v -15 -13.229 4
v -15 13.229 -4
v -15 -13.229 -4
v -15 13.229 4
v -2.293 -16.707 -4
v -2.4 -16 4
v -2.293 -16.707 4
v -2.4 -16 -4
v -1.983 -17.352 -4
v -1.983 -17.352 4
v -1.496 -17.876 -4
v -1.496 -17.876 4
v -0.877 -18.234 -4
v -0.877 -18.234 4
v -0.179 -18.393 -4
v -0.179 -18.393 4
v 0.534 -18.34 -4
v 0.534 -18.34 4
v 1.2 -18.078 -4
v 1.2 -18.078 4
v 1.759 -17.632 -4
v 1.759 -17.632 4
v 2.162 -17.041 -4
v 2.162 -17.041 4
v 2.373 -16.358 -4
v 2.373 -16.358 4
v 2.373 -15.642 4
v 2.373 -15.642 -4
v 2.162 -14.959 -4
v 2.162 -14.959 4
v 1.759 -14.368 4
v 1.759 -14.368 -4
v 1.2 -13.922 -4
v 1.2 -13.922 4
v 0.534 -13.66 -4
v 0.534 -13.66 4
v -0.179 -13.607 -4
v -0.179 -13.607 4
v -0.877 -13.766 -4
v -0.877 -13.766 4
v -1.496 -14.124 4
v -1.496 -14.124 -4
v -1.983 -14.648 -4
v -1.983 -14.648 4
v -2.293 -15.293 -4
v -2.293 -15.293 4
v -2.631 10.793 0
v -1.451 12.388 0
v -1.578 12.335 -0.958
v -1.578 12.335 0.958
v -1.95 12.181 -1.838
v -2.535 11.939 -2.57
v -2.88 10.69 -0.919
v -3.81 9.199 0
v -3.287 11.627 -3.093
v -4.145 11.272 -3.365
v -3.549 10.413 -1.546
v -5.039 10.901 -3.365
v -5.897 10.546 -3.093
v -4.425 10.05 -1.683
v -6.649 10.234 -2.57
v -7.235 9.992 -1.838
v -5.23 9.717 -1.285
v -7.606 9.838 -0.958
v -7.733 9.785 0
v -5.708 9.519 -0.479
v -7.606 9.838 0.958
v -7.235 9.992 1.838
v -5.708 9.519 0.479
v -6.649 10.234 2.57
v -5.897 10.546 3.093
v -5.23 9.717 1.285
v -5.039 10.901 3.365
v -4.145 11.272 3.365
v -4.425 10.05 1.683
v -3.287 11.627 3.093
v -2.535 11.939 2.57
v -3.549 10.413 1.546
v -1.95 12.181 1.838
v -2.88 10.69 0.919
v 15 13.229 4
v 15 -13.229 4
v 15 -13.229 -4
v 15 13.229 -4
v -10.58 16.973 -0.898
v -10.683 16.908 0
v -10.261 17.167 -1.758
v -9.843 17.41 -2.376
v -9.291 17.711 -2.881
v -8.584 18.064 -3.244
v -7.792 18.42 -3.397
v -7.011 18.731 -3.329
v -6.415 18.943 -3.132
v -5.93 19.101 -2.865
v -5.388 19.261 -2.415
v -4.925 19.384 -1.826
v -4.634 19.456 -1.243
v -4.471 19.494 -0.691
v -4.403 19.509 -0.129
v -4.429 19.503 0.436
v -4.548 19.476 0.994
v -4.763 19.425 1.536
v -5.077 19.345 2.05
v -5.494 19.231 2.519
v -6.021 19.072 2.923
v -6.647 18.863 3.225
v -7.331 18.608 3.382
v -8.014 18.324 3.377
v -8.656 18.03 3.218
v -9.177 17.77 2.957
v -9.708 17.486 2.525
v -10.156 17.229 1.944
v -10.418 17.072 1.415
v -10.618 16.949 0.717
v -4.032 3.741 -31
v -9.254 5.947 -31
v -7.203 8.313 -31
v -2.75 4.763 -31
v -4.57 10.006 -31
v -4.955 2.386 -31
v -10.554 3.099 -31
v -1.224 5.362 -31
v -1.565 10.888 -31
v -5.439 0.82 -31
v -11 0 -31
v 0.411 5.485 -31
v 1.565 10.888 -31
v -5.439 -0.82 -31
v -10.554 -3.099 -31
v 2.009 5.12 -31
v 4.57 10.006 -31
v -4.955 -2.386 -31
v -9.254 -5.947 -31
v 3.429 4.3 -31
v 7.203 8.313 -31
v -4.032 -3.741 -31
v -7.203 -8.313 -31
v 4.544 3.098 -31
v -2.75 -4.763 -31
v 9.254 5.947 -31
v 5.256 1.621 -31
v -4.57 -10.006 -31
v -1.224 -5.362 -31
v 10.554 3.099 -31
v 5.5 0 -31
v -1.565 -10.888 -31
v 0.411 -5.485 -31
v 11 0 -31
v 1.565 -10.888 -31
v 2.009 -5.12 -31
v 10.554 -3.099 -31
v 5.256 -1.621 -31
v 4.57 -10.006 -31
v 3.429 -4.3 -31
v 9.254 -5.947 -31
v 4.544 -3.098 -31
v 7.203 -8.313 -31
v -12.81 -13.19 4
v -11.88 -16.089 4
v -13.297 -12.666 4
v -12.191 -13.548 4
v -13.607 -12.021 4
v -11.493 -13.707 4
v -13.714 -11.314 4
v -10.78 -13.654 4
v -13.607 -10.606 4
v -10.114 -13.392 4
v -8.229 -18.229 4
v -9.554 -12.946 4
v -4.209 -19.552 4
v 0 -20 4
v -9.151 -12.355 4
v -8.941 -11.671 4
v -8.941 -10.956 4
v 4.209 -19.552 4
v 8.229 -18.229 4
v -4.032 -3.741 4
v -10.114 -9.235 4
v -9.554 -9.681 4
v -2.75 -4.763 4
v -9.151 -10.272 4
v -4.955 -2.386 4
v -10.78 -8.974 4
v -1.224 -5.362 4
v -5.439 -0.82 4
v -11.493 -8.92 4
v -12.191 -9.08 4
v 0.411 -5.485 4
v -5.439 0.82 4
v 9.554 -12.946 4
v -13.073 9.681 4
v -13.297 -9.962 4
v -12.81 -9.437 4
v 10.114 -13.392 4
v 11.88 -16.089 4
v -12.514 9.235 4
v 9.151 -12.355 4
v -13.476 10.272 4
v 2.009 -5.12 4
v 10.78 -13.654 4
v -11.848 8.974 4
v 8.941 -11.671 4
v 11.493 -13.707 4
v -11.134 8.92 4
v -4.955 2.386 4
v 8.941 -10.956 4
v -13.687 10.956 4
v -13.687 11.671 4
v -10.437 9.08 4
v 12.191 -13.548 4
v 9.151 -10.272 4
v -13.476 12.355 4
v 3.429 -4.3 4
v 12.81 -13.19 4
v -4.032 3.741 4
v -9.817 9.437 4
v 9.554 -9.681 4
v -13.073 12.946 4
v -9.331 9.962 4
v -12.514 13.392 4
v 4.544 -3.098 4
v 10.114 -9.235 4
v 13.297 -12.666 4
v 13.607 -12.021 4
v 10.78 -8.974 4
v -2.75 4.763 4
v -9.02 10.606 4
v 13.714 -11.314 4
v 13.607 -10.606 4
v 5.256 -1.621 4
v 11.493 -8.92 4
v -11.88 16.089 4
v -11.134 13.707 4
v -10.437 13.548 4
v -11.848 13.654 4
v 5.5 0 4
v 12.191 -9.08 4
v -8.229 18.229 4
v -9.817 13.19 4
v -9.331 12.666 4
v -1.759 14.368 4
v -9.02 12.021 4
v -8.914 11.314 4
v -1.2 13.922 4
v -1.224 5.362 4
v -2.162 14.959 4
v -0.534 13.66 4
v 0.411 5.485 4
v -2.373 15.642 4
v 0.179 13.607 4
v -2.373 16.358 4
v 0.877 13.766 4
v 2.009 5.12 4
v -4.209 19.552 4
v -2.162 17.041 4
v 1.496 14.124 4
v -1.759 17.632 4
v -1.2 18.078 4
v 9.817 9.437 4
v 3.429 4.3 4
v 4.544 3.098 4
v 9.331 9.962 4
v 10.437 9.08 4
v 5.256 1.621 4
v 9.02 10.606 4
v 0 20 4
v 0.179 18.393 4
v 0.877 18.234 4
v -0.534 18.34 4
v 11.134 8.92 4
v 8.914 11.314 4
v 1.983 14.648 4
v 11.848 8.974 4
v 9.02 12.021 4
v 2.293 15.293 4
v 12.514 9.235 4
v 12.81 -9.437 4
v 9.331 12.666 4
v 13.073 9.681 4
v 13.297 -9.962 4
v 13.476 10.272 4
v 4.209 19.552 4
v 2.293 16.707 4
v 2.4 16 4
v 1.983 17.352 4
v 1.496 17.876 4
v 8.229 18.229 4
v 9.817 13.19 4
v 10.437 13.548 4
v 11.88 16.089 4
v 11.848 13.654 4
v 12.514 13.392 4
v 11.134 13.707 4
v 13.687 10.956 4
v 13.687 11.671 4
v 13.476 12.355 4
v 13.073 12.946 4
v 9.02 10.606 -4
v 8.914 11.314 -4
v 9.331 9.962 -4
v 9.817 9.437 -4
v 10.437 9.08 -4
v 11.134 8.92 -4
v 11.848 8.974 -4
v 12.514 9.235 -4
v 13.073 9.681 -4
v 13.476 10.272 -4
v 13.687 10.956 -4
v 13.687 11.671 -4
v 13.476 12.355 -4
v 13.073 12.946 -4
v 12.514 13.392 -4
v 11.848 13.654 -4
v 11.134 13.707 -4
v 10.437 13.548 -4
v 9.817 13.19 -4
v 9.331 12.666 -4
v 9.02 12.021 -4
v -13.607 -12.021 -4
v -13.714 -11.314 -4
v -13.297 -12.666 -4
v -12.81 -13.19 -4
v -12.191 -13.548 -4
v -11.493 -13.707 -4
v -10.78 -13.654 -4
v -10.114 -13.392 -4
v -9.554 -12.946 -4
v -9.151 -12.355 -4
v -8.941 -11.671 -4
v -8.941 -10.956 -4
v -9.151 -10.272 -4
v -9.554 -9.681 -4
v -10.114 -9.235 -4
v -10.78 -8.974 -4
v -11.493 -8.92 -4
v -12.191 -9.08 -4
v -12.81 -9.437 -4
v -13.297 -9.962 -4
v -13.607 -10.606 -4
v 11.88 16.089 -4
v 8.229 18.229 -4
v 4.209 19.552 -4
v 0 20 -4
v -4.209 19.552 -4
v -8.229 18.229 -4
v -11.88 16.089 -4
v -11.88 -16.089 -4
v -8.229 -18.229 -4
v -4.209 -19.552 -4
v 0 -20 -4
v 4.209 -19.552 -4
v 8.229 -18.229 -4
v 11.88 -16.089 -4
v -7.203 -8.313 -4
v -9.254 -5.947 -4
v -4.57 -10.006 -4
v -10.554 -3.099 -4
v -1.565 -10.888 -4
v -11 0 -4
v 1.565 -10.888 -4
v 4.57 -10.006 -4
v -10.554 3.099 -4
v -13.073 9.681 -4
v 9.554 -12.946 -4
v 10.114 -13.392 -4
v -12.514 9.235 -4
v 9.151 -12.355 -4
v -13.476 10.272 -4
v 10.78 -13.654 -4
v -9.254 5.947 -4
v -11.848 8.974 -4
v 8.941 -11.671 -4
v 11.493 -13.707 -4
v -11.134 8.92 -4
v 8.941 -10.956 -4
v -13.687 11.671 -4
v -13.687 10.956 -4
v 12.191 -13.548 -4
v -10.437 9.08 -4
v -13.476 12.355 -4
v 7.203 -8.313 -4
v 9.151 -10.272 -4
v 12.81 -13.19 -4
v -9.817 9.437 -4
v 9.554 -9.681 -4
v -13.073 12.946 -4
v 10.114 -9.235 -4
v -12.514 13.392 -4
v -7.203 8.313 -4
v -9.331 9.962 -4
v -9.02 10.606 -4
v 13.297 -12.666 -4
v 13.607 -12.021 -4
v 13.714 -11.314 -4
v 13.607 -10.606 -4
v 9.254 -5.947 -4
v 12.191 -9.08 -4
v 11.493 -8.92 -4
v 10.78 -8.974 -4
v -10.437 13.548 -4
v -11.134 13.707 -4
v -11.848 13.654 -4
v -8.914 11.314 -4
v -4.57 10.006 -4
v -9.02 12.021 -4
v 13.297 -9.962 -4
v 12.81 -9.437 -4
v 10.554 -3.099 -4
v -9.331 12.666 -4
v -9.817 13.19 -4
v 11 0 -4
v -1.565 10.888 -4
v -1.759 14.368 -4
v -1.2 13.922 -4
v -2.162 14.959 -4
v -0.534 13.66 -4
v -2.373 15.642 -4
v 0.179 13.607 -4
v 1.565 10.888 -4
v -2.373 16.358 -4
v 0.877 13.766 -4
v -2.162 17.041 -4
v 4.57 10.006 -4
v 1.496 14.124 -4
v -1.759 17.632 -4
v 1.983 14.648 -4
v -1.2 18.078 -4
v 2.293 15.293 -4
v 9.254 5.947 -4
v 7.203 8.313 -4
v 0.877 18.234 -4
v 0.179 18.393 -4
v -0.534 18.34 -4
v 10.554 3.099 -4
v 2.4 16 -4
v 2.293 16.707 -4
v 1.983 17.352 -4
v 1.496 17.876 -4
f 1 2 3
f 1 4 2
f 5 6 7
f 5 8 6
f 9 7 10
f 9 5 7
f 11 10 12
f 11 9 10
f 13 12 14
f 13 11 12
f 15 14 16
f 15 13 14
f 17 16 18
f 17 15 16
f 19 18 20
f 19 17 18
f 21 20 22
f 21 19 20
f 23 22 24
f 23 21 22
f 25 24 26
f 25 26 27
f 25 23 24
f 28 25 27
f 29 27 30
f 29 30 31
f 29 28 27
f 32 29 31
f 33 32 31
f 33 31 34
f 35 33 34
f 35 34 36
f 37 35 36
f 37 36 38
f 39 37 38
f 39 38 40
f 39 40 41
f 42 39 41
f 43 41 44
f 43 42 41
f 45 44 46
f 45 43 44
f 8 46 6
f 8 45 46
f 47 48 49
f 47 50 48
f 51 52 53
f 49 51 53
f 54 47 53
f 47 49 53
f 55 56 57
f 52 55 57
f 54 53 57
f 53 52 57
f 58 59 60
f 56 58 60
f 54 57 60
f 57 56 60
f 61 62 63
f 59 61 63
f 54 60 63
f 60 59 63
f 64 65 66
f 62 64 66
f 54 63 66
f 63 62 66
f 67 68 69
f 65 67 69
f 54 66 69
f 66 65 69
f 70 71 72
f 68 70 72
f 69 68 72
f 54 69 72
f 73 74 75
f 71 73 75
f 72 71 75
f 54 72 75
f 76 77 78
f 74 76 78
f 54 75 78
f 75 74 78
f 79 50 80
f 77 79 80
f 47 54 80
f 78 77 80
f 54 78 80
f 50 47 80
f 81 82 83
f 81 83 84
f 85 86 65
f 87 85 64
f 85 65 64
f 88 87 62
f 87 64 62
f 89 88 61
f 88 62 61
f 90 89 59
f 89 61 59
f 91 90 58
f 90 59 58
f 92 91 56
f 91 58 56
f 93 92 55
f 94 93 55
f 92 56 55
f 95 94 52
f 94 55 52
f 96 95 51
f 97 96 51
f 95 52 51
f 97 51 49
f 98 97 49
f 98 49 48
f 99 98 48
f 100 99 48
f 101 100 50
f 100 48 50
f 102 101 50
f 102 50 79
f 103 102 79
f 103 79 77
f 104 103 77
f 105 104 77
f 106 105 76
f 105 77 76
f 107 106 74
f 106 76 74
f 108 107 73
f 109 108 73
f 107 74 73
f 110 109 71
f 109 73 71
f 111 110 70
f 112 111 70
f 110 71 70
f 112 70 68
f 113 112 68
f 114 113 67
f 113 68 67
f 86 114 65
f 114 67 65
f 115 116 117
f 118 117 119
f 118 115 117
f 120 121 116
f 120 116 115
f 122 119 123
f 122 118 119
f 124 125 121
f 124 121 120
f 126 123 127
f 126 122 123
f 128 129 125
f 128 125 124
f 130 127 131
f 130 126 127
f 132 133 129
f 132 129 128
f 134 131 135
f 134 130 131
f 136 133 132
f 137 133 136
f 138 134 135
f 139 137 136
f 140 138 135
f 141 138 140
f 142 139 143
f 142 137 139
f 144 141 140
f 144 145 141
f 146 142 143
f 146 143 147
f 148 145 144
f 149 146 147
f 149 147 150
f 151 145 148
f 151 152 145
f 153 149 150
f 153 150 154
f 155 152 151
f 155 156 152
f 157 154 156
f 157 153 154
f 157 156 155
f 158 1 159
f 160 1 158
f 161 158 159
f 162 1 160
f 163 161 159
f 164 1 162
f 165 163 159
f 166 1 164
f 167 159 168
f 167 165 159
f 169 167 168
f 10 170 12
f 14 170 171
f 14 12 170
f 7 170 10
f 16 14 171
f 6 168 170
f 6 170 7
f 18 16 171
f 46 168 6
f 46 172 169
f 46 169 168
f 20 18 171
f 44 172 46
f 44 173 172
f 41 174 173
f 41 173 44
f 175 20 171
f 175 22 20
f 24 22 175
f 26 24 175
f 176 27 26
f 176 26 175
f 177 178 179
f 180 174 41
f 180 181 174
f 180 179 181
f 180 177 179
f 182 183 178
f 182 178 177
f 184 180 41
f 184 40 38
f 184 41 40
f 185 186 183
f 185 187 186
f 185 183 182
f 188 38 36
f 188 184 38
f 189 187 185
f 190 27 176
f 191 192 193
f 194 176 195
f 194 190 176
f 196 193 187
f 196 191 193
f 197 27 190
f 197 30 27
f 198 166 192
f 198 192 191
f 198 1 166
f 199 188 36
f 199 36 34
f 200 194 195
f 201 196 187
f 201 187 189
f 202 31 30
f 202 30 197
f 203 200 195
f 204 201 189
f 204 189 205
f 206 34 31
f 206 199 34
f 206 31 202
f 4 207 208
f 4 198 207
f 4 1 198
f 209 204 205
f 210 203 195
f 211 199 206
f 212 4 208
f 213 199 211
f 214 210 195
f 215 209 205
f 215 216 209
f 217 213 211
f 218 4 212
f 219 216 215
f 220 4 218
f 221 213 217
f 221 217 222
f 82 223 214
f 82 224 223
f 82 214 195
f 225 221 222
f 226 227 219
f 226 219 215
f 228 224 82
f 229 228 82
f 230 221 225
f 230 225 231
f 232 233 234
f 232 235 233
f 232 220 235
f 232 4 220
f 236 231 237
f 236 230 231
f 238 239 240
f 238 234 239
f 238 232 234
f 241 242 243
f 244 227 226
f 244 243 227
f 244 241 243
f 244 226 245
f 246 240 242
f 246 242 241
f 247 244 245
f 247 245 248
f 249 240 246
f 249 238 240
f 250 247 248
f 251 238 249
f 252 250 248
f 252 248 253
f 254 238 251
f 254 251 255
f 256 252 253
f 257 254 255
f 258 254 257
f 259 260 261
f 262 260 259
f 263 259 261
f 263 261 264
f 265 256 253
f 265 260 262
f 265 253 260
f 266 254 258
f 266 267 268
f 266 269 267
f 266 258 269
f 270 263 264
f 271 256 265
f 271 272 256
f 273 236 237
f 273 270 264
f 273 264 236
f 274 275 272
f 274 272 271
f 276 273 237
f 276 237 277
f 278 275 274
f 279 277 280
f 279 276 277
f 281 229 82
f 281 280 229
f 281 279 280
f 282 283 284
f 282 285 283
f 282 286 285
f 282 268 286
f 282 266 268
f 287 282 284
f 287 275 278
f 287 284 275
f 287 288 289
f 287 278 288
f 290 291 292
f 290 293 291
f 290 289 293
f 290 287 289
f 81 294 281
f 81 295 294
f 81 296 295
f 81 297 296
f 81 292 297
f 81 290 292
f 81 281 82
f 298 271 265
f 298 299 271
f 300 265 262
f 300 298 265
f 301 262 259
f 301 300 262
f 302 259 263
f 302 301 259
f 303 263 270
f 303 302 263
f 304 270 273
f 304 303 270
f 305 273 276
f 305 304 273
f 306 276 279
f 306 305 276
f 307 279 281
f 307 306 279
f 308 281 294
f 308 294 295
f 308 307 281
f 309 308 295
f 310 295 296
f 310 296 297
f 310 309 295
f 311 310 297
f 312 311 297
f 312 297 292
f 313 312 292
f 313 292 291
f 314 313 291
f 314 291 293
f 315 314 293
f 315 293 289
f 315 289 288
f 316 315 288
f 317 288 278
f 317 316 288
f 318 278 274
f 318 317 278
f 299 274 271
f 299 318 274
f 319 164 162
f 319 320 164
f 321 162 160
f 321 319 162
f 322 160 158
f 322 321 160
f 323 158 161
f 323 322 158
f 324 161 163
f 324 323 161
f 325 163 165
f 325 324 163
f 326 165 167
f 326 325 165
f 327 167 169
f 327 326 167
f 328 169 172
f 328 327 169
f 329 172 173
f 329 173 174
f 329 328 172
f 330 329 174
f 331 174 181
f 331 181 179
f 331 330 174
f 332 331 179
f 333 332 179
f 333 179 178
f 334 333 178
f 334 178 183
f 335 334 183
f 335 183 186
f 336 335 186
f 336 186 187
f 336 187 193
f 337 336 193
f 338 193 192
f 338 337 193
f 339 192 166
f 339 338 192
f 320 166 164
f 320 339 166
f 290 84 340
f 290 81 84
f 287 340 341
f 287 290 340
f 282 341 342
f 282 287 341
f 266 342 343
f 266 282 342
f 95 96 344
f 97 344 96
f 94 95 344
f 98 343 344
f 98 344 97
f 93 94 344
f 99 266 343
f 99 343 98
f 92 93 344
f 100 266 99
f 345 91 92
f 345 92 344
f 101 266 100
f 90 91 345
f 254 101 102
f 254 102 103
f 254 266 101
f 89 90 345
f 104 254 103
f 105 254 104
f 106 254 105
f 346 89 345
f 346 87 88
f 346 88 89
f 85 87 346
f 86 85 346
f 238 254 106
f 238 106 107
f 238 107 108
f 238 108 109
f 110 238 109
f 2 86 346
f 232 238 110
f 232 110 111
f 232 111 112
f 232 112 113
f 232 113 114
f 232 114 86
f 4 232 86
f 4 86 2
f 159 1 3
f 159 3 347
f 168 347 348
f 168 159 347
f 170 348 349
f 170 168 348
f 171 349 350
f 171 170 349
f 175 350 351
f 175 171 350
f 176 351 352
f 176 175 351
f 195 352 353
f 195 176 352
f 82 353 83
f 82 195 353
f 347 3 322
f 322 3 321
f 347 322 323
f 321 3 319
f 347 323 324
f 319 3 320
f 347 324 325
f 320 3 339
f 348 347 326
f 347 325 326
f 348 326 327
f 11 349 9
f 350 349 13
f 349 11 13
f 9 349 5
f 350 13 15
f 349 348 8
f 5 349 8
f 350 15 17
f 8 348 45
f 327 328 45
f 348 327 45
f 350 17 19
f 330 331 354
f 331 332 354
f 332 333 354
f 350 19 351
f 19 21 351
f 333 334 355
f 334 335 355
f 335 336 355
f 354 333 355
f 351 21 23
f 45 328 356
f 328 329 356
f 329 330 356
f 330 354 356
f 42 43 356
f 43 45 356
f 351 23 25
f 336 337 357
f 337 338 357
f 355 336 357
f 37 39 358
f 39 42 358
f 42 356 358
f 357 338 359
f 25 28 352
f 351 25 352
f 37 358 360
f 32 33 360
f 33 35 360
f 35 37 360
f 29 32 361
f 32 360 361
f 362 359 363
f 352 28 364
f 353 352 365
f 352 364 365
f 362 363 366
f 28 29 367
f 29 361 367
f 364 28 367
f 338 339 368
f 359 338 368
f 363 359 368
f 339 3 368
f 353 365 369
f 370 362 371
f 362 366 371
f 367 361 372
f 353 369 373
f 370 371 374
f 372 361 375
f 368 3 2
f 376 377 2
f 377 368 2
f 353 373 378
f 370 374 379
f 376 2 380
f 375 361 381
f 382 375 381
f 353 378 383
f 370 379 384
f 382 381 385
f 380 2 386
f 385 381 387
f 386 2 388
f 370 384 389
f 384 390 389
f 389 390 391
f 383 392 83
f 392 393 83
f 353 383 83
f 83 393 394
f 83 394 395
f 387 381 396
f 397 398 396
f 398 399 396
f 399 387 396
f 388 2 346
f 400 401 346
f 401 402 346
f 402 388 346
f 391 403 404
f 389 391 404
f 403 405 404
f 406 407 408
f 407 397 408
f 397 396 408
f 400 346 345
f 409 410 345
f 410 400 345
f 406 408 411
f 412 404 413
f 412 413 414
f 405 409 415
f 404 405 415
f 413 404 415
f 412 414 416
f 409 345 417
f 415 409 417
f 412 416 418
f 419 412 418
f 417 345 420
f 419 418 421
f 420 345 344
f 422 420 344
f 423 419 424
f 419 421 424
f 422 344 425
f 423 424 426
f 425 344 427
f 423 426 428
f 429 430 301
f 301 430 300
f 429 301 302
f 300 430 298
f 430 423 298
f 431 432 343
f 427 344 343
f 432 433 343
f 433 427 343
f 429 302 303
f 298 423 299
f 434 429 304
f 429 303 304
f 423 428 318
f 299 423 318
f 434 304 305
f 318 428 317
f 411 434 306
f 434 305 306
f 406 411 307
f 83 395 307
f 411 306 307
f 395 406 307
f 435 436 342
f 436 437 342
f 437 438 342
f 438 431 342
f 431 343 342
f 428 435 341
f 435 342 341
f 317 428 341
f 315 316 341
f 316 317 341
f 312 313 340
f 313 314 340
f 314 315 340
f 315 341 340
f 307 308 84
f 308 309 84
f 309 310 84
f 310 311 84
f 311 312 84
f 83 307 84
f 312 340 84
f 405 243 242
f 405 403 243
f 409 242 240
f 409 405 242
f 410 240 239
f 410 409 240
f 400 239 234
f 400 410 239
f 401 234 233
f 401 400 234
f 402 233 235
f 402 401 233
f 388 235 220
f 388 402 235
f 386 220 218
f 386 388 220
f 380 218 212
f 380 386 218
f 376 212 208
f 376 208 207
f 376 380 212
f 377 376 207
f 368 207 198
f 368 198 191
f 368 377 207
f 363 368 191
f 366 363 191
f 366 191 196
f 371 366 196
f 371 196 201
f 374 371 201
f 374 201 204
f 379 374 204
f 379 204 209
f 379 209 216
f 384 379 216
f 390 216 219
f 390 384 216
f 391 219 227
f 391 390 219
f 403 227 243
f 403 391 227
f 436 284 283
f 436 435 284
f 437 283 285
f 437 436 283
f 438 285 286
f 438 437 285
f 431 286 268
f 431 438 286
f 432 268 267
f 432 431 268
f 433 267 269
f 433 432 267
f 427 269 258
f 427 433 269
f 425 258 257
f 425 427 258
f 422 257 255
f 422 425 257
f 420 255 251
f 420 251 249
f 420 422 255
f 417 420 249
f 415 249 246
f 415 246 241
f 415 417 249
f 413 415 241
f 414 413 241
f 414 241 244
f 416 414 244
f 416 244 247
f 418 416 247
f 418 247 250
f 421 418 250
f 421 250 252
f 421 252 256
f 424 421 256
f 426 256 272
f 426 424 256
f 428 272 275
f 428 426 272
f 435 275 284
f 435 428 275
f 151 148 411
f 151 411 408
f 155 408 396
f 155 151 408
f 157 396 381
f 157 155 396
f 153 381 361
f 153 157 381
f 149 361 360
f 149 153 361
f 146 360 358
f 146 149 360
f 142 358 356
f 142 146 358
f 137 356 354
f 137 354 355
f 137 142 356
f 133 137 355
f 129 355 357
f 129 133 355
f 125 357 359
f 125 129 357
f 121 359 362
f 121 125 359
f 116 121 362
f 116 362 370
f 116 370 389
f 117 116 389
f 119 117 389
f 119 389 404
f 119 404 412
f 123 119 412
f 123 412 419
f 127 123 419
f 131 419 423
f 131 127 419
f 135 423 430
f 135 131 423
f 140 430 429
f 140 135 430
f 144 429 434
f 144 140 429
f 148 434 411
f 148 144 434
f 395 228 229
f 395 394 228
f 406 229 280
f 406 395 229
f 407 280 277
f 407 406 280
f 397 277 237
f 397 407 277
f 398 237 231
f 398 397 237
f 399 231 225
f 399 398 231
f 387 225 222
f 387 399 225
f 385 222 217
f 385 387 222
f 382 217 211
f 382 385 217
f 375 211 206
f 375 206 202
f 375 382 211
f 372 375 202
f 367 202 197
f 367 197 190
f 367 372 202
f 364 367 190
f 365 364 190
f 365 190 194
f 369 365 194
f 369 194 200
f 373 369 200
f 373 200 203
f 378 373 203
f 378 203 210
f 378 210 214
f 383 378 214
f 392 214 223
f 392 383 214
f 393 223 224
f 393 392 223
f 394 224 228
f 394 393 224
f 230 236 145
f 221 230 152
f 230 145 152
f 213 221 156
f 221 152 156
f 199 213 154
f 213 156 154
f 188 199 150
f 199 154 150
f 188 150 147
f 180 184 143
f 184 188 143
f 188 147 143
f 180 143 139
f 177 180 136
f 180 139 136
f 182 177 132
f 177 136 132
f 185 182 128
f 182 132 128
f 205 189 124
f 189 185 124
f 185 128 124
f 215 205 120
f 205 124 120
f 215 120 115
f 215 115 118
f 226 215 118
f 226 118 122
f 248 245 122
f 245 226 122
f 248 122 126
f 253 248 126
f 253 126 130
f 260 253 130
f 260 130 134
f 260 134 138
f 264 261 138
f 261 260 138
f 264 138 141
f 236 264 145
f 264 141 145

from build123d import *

# Parameters (mm, degrees)
SKETCH1_R                  = 5.5
SKETCH1_R_2                = 2.4
BOSS_EXTRUDE1_DEPTH        = 4
BOSS_EXTRUDE2_START        = 27
SKETCH2_R                  = 11
SKETCH2_R_2                = 5.5
BOSS_EXTRUDE2_DEPTH        = 27
M8X1_25_TAPPED_HOLE1_D     = 6.8
M8X1_25_TAPPED_HOLE1_DEPTH = 8
M8X1_25_TAPPED_HOLE1_TIP   = 2.042926105


with BuildPart() as part:
    # Sketch1 → Boss-Extrude1 (new, symmetric)
    with BuildSketch(Plane.XY):
        with BuildLine():
            Line((-15, 13.228756555), (-15, -13.228756555))
            ThreePointArc((-15, -13.228756555), (0, -20), (15, -13.228756555))
            Line((15, -13.228756555), (15, 13.228756555))
            ThreePointArc((15, 13.228756555), (0, 20), (-15, 13.228756555))
        make_face()
        Circle(SKETCH1_R, mode=Mode.SUBTRACT)
        with Locations((-11.313708499, 11.313708499)):
            Circle(SKETCH1_R_2, mode=Mode.SUBTRACT)
        with Locations((0, 16)):
            Circle(SKETCH1_R_2, mode=Mode.SUBTRACT)
        with Locations(Location((11.313708499, 11.313708499, 0), (0, 0, 180))):
            Circle(SKETCH1_R_2, mode=Mode.SUBTRACT)
        with Locations((11.313708499, -11.313708499)):
            Circle(SKETCH1_R_2, mode=Mode.SUBTRACT)
        with Locations(Location((0, -16, 0), (0, 0, 180))):
            Circle(SKETCH1_R_2, mode=Mode.SUBTRACT)
        with Locations(Location((-11.313708499, -11.313708499, 0), (0, 0, 180))):
            Circle(SKETCH1_R_2, mode=Mode.SUBTRACT)
    extrude(amount=BOSS_EXTRUDE1_DEPTH, both=True)

    # Sketch2 → Boss-Extrude2 (add)
    with BuildSketch(Plane(origin=(0, 0, -4), x_dir=(-1, 0, 0), z_dir=(0, 0, -1)).offset(BOSS_EXTRUDE2_START)):
        with Locations(Location((0, 0, 0), (0, 0, 180))):
            Circle(SKETCH2_R)
        with Locations(Location((0, 0, 0), (0, 0, 180))):
            Circle(SKETCH2_R_2, mode=Mode.SUBTRACT)
    extrude(amount=-BOSS_EXTRUDE2_DEPTH)

    # M8x1.25 Tapped Hole1
    with Locations(Plane(origin=(-7.653668647, 18.47759065, 0), x_dir=(0.923879532511, 0.382683432365, 0), z_dir=(-0.382683432365, 0.923879532511, 0))):
        with Locations((0, 0)):
            Hole(M8X1_25_TAPPED_HOLE1_D / 2, depth=M8X1_25_TAPPED_HOLE1_DEPTH)
            with Locations((0, 0, -(M8X1_25_TAPPED_HOLE1_DEPTH + M8X1_25_TAPPED_HOLE1_TIP / 2))):  # 118° drill point
                Cone(0, M8X1_25_TAPPED_HOLE1_D / 2, M8X1_25_TAPPED_HOLE1_TIP, mode=Mode.SUBTRACT)


solid = part.part
